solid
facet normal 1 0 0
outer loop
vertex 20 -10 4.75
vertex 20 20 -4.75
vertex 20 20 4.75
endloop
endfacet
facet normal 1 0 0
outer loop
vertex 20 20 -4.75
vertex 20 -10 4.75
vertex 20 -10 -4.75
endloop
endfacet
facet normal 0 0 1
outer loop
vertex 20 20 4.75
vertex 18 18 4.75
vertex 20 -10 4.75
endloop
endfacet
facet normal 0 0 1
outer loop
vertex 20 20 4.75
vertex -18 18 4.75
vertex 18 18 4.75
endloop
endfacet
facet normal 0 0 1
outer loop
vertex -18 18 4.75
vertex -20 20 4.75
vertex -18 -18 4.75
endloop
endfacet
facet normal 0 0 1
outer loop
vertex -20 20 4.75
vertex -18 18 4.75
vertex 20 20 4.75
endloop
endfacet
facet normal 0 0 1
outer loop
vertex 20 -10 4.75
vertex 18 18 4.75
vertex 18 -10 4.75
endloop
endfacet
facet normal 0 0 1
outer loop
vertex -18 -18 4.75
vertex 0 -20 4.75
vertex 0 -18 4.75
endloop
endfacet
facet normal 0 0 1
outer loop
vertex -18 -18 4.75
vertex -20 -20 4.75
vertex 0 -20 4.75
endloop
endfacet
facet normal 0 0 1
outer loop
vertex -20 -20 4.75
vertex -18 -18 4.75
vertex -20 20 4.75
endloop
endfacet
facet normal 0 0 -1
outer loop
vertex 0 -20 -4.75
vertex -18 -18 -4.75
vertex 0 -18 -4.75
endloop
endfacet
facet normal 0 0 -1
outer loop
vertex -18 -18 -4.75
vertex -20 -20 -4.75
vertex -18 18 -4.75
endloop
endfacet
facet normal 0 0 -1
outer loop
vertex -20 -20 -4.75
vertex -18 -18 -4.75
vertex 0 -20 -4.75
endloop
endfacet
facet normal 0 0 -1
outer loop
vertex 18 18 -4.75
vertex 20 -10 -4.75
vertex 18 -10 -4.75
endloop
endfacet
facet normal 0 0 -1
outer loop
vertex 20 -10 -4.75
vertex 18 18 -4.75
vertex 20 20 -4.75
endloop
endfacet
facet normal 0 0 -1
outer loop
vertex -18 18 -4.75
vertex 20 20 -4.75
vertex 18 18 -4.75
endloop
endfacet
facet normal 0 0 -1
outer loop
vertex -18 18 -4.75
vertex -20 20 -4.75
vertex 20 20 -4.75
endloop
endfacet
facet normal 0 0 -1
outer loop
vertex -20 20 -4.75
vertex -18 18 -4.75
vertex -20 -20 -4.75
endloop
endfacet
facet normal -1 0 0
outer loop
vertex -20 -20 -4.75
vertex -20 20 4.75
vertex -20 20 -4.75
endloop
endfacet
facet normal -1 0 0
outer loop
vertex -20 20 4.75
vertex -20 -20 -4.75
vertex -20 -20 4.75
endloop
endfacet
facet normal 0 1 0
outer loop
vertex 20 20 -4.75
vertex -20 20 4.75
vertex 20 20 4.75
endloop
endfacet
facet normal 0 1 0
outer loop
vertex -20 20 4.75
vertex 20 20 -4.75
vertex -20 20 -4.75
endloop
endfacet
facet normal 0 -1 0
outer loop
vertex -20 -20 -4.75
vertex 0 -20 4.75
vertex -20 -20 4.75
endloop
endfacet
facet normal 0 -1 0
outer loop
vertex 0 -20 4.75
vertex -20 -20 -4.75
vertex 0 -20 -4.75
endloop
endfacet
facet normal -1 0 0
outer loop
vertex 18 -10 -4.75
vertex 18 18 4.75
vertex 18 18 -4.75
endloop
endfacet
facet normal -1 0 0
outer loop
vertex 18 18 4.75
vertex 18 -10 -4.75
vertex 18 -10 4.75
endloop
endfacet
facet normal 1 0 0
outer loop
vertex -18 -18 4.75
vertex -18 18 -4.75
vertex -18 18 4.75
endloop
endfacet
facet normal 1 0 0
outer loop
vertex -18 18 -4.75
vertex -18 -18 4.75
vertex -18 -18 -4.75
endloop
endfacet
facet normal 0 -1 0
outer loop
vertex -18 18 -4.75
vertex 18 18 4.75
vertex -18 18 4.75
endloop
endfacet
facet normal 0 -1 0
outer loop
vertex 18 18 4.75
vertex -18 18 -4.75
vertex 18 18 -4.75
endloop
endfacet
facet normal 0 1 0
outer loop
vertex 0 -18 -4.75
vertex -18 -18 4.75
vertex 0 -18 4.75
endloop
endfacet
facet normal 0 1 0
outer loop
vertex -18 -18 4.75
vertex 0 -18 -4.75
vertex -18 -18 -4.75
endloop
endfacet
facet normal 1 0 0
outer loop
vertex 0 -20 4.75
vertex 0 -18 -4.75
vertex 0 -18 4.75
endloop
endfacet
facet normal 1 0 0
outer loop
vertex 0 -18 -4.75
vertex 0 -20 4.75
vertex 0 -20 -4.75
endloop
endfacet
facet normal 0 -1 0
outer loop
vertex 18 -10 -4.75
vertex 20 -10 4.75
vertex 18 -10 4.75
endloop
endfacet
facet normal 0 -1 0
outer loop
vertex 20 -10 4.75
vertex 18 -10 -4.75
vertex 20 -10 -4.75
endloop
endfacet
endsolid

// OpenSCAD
module centrifugal_blower_fan() {
    difference() {
        // Outer casing
        translate([-20, -20, -4.75])
            cube([40, 40, 9.5]);

        // Inner cavity
        translate([-18, -18, -5])
            cube([36, 36, 10]);

        // Air outlet
        translate([0, -20, -4.75])
            cube([20, 10, 9.5]);

        // Fan blades
        for (i = [0:5]) {
            rotate([0, 0, i * 60])
                translate([0, 0, -4.75])
                    fan_blade();
        }
    }
}

module fan_blade() {
    difference() {
        translate([-1, -10, 0])
            cube([2, 20, 9.5]);
        translate([-1, -10, -1])
            rotate([0, 0, 45])
                cube([2, 20, 10]);
    }
}

centrifugal_blower_fan();
